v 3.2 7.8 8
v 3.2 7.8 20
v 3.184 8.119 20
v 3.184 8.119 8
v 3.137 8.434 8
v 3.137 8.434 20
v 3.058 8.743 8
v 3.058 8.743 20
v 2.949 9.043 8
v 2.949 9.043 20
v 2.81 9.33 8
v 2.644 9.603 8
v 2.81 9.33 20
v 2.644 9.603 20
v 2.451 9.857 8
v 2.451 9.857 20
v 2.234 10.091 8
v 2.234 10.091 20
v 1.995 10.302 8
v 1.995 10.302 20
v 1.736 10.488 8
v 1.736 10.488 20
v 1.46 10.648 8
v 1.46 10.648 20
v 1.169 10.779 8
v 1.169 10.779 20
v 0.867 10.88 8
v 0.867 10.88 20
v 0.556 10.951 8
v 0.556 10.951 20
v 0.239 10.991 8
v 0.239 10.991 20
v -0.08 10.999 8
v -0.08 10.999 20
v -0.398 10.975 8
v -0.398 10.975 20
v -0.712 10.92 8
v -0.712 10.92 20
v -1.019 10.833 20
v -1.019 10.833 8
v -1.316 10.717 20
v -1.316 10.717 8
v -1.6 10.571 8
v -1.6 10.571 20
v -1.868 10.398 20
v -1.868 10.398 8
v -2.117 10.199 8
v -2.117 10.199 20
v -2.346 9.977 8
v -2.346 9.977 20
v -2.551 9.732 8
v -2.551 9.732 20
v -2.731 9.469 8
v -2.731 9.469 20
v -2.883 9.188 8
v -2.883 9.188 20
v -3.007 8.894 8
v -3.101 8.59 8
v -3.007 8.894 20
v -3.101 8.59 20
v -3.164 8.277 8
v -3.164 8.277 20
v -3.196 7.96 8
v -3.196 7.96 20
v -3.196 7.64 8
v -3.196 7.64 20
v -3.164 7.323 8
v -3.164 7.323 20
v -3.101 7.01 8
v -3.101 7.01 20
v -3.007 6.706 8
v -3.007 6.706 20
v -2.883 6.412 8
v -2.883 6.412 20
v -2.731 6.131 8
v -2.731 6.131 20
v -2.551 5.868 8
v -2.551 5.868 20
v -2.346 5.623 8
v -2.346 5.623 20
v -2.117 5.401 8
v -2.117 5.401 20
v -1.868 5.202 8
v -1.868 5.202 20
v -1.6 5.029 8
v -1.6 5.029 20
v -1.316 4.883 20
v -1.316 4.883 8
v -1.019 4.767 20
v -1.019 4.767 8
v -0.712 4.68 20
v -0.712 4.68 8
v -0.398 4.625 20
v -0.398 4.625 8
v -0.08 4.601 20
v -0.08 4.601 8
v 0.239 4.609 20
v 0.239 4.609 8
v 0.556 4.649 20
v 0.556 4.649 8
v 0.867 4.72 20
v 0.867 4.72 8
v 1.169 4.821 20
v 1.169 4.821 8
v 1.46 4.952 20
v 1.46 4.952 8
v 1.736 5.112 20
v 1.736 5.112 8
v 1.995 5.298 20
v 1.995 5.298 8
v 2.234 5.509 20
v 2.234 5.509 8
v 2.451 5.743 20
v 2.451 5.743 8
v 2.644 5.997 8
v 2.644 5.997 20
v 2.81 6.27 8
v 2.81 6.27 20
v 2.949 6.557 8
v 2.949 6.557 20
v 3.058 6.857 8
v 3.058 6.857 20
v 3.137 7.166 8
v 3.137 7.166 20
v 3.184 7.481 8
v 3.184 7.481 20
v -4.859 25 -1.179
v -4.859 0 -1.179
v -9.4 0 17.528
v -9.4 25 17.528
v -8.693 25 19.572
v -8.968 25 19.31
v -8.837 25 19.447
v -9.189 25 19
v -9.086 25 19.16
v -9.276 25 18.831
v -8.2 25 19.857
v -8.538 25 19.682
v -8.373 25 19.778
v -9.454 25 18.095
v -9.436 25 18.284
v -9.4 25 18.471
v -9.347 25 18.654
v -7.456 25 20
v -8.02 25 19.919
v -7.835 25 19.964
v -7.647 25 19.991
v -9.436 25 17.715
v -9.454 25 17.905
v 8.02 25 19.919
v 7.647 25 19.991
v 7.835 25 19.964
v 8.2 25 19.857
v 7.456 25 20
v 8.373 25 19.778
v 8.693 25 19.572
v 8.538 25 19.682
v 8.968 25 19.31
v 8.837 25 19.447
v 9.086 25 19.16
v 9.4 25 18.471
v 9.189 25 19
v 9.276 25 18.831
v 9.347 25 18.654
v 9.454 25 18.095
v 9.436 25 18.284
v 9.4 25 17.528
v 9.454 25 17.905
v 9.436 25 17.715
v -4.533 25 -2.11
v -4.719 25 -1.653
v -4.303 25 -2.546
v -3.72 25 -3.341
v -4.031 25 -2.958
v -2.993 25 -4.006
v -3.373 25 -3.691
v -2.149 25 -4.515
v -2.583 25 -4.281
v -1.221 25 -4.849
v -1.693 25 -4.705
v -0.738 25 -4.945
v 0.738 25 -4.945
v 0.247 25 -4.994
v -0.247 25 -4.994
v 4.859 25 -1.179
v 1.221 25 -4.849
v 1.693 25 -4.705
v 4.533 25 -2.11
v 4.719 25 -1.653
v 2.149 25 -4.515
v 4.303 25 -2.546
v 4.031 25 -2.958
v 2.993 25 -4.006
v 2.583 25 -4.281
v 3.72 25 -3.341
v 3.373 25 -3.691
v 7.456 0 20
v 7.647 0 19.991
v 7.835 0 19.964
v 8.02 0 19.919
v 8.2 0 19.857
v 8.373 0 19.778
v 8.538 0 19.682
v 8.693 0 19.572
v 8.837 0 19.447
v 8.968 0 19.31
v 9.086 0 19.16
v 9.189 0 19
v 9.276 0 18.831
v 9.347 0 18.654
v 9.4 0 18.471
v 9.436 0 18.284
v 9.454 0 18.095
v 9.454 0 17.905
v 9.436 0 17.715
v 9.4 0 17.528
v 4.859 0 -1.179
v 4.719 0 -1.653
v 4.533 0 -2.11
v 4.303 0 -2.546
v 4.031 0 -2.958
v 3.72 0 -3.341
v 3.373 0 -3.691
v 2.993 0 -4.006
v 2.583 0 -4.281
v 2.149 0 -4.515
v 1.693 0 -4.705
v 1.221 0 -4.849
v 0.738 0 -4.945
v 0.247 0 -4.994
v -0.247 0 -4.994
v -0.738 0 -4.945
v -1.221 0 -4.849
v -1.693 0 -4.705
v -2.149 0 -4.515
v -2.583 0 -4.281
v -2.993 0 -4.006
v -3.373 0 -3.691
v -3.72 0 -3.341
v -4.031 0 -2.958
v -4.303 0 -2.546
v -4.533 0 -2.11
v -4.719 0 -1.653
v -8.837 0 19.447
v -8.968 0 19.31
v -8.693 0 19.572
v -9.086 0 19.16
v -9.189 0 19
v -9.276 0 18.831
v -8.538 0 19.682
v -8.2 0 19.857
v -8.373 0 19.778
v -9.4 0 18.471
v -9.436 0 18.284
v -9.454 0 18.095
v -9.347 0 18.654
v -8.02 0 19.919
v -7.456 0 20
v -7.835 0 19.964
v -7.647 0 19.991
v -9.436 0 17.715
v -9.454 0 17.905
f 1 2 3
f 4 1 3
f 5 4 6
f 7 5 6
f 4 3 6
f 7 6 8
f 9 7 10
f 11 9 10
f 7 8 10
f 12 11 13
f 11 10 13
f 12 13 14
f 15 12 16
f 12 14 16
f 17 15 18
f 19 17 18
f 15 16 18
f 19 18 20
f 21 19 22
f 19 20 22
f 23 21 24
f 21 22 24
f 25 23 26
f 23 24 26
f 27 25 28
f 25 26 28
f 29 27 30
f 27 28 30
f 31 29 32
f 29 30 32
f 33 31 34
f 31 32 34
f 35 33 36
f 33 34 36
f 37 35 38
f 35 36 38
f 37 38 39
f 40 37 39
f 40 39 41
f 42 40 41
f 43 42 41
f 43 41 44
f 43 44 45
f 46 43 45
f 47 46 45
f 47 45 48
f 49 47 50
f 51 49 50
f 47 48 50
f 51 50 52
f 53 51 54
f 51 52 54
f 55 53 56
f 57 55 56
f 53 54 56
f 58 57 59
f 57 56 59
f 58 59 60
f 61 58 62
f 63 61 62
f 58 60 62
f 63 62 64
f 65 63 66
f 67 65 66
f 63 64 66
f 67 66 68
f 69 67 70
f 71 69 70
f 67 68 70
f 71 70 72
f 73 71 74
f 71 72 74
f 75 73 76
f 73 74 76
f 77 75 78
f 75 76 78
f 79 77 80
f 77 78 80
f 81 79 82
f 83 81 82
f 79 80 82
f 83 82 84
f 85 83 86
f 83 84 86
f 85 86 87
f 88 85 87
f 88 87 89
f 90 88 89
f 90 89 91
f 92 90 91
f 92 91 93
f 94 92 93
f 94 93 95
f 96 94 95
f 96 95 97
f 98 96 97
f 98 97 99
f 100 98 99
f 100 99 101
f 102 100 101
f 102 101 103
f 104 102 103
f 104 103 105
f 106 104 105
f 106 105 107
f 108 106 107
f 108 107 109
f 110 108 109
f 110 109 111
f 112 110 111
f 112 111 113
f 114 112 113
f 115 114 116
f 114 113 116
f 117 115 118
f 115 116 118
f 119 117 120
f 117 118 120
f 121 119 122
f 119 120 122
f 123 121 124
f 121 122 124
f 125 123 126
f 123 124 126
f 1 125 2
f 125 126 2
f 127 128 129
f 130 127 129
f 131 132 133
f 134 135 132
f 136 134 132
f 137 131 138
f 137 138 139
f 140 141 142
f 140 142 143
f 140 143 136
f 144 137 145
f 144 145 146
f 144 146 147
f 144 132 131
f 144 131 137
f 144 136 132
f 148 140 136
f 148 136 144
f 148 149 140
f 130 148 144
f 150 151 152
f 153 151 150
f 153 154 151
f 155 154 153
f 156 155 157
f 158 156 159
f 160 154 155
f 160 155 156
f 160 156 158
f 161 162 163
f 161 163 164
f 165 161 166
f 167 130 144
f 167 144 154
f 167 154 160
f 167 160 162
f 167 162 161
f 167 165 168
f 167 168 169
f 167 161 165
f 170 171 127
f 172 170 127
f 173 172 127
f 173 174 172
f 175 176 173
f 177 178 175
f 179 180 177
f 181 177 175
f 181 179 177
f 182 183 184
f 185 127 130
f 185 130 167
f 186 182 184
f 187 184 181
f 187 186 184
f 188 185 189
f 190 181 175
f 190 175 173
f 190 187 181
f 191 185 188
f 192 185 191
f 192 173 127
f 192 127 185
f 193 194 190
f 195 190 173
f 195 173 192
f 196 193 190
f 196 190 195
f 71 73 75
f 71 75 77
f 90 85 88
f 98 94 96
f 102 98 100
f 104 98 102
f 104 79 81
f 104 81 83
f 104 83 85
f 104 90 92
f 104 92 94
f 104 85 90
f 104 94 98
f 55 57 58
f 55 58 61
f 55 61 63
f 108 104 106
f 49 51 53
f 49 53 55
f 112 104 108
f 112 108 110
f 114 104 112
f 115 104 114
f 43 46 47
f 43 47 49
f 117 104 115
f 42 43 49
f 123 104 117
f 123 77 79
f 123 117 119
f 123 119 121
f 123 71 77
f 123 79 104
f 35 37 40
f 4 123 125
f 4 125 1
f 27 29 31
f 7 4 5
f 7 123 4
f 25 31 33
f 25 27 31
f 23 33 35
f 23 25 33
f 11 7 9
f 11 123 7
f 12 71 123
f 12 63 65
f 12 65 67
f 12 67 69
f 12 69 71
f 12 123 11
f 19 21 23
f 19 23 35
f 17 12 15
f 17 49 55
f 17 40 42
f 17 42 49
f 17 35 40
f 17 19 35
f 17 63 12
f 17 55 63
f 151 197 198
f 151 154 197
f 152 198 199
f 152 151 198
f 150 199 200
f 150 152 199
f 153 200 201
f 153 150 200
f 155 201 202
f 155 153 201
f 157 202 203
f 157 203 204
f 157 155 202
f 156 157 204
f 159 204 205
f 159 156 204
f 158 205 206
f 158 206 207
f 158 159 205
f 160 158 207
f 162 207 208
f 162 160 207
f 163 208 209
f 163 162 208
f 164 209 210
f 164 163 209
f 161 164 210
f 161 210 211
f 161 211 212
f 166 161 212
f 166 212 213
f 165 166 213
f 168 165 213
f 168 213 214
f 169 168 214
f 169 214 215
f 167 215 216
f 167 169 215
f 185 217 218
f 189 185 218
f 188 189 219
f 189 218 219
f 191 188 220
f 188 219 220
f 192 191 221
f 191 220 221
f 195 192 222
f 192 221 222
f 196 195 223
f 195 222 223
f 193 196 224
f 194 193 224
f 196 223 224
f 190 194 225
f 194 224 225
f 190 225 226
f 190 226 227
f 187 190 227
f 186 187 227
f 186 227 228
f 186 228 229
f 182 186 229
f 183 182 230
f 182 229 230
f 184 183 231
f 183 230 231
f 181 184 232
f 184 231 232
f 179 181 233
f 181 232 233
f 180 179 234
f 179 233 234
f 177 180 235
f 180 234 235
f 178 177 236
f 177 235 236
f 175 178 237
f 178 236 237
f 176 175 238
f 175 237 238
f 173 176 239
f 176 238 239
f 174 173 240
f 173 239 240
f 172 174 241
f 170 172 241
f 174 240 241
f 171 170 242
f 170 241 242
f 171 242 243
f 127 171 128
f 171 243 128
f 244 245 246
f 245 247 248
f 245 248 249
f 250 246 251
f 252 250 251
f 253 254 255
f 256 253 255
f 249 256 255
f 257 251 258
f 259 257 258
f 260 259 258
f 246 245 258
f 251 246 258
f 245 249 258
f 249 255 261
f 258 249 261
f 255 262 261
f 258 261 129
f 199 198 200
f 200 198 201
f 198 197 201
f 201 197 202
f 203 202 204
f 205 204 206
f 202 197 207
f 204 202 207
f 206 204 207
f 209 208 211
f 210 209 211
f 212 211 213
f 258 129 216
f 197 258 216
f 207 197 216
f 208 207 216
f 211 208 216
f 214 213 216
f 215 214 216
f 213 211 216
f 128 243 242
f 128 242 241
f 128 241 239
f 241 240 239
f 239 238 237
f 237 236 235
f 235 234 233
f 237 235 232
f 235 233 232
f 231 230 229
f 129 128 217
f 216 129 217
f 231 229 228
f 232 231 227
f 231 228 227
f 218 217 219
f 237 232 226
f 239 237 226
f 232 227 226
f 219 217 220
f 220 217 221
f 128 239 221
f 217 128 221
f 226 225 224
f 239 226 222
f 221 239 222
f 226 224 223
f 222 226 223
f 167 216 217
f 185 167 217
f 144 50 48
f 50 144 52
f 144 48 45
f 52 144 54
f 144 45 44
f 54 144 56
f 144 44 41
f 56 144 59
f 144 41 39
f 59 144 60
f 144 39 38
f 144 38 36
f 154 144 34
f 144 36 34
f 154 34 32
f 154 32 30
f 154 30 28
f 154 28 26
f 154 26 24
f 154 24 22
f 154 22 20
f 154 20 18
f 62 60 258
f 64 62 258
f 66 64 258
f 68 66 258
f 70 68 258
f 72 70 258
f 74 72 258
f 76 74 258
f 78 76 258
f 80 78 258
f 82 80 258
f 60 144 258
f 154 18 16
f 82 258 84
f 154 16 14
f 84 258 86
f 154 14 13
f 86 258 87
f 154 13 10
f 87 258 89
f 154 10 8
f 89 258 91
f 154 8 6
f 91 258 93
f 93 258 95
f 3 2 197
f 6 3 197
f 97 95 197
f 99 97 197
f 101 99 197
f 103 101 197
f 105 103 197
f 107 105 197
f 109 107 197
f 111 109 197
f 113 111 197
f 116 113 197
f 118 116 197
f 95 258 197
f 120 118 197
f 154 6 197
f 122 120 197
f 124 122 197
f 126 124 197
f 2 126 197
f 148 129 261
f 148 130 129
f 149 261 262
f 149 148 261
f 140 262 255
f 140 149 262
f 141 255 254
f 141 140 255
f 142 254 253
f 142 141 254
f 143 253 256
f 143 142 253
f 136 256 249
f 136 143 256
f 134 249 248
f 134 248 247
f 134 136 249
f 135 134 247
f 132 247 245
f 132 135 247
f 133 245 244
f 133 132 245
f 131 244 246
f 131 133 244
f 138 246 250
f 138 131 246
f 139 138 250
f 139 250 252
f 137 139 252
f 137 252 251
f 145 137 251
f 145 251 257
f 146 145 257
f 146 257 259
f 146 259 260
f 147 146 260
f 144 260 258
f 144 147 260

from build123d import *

# Parameters (mm, degrees)
SALIENTE_EXTRUIR1_DEPTH = 25
CROQUIS2_R              = 3.2
CORTAR_EXTRUIR1_DEPTH   = 12
REDONDEO1_R             = 2


with BuildPart() as part:
    # Croquis1 → Saliente-Extruir1 (new body)
    with BuildSketch(Plane(origin=(0, 0, 0), x_dir=(1, 0, 0), z_dir=(0, 1, 0))):
        with BuildLine():
            Line((-4.858898944, 1.179449472), (-10, -20))
            Line((-10, -20), (10, -20))
            Line((10, -20), (4.858898944, 1.179449472))
            ThreePointArc((4.858898944, 1.179449472), (0, 5), (-4.858898944, 1.179449472))
        make_face()
    extrude(amount=SALIENTE_EXTRUIR1_DEPTH)

    # Croquis2 → Cortar-Extruir1 (cut)
    with BuildSketch(Plane.XY.offset(20)):
        with Locations((0, 7.8)):
            Circle(CROQUIS2_R)
    extrude(amount=-CORTAR_EXTRUIR1_DEPTH, mode=Mode.SUBTRACT)

    # Redondeo1
    redondeo1_edges = [part.edges().sort_by_distance(p)[0] for p in [
        (10, 12.5, 20),
        (-10, 12.5, 20),
    ]]
    fillet(redondeo1_edges, radius=REDONDEO1_R)


solid = part.part
